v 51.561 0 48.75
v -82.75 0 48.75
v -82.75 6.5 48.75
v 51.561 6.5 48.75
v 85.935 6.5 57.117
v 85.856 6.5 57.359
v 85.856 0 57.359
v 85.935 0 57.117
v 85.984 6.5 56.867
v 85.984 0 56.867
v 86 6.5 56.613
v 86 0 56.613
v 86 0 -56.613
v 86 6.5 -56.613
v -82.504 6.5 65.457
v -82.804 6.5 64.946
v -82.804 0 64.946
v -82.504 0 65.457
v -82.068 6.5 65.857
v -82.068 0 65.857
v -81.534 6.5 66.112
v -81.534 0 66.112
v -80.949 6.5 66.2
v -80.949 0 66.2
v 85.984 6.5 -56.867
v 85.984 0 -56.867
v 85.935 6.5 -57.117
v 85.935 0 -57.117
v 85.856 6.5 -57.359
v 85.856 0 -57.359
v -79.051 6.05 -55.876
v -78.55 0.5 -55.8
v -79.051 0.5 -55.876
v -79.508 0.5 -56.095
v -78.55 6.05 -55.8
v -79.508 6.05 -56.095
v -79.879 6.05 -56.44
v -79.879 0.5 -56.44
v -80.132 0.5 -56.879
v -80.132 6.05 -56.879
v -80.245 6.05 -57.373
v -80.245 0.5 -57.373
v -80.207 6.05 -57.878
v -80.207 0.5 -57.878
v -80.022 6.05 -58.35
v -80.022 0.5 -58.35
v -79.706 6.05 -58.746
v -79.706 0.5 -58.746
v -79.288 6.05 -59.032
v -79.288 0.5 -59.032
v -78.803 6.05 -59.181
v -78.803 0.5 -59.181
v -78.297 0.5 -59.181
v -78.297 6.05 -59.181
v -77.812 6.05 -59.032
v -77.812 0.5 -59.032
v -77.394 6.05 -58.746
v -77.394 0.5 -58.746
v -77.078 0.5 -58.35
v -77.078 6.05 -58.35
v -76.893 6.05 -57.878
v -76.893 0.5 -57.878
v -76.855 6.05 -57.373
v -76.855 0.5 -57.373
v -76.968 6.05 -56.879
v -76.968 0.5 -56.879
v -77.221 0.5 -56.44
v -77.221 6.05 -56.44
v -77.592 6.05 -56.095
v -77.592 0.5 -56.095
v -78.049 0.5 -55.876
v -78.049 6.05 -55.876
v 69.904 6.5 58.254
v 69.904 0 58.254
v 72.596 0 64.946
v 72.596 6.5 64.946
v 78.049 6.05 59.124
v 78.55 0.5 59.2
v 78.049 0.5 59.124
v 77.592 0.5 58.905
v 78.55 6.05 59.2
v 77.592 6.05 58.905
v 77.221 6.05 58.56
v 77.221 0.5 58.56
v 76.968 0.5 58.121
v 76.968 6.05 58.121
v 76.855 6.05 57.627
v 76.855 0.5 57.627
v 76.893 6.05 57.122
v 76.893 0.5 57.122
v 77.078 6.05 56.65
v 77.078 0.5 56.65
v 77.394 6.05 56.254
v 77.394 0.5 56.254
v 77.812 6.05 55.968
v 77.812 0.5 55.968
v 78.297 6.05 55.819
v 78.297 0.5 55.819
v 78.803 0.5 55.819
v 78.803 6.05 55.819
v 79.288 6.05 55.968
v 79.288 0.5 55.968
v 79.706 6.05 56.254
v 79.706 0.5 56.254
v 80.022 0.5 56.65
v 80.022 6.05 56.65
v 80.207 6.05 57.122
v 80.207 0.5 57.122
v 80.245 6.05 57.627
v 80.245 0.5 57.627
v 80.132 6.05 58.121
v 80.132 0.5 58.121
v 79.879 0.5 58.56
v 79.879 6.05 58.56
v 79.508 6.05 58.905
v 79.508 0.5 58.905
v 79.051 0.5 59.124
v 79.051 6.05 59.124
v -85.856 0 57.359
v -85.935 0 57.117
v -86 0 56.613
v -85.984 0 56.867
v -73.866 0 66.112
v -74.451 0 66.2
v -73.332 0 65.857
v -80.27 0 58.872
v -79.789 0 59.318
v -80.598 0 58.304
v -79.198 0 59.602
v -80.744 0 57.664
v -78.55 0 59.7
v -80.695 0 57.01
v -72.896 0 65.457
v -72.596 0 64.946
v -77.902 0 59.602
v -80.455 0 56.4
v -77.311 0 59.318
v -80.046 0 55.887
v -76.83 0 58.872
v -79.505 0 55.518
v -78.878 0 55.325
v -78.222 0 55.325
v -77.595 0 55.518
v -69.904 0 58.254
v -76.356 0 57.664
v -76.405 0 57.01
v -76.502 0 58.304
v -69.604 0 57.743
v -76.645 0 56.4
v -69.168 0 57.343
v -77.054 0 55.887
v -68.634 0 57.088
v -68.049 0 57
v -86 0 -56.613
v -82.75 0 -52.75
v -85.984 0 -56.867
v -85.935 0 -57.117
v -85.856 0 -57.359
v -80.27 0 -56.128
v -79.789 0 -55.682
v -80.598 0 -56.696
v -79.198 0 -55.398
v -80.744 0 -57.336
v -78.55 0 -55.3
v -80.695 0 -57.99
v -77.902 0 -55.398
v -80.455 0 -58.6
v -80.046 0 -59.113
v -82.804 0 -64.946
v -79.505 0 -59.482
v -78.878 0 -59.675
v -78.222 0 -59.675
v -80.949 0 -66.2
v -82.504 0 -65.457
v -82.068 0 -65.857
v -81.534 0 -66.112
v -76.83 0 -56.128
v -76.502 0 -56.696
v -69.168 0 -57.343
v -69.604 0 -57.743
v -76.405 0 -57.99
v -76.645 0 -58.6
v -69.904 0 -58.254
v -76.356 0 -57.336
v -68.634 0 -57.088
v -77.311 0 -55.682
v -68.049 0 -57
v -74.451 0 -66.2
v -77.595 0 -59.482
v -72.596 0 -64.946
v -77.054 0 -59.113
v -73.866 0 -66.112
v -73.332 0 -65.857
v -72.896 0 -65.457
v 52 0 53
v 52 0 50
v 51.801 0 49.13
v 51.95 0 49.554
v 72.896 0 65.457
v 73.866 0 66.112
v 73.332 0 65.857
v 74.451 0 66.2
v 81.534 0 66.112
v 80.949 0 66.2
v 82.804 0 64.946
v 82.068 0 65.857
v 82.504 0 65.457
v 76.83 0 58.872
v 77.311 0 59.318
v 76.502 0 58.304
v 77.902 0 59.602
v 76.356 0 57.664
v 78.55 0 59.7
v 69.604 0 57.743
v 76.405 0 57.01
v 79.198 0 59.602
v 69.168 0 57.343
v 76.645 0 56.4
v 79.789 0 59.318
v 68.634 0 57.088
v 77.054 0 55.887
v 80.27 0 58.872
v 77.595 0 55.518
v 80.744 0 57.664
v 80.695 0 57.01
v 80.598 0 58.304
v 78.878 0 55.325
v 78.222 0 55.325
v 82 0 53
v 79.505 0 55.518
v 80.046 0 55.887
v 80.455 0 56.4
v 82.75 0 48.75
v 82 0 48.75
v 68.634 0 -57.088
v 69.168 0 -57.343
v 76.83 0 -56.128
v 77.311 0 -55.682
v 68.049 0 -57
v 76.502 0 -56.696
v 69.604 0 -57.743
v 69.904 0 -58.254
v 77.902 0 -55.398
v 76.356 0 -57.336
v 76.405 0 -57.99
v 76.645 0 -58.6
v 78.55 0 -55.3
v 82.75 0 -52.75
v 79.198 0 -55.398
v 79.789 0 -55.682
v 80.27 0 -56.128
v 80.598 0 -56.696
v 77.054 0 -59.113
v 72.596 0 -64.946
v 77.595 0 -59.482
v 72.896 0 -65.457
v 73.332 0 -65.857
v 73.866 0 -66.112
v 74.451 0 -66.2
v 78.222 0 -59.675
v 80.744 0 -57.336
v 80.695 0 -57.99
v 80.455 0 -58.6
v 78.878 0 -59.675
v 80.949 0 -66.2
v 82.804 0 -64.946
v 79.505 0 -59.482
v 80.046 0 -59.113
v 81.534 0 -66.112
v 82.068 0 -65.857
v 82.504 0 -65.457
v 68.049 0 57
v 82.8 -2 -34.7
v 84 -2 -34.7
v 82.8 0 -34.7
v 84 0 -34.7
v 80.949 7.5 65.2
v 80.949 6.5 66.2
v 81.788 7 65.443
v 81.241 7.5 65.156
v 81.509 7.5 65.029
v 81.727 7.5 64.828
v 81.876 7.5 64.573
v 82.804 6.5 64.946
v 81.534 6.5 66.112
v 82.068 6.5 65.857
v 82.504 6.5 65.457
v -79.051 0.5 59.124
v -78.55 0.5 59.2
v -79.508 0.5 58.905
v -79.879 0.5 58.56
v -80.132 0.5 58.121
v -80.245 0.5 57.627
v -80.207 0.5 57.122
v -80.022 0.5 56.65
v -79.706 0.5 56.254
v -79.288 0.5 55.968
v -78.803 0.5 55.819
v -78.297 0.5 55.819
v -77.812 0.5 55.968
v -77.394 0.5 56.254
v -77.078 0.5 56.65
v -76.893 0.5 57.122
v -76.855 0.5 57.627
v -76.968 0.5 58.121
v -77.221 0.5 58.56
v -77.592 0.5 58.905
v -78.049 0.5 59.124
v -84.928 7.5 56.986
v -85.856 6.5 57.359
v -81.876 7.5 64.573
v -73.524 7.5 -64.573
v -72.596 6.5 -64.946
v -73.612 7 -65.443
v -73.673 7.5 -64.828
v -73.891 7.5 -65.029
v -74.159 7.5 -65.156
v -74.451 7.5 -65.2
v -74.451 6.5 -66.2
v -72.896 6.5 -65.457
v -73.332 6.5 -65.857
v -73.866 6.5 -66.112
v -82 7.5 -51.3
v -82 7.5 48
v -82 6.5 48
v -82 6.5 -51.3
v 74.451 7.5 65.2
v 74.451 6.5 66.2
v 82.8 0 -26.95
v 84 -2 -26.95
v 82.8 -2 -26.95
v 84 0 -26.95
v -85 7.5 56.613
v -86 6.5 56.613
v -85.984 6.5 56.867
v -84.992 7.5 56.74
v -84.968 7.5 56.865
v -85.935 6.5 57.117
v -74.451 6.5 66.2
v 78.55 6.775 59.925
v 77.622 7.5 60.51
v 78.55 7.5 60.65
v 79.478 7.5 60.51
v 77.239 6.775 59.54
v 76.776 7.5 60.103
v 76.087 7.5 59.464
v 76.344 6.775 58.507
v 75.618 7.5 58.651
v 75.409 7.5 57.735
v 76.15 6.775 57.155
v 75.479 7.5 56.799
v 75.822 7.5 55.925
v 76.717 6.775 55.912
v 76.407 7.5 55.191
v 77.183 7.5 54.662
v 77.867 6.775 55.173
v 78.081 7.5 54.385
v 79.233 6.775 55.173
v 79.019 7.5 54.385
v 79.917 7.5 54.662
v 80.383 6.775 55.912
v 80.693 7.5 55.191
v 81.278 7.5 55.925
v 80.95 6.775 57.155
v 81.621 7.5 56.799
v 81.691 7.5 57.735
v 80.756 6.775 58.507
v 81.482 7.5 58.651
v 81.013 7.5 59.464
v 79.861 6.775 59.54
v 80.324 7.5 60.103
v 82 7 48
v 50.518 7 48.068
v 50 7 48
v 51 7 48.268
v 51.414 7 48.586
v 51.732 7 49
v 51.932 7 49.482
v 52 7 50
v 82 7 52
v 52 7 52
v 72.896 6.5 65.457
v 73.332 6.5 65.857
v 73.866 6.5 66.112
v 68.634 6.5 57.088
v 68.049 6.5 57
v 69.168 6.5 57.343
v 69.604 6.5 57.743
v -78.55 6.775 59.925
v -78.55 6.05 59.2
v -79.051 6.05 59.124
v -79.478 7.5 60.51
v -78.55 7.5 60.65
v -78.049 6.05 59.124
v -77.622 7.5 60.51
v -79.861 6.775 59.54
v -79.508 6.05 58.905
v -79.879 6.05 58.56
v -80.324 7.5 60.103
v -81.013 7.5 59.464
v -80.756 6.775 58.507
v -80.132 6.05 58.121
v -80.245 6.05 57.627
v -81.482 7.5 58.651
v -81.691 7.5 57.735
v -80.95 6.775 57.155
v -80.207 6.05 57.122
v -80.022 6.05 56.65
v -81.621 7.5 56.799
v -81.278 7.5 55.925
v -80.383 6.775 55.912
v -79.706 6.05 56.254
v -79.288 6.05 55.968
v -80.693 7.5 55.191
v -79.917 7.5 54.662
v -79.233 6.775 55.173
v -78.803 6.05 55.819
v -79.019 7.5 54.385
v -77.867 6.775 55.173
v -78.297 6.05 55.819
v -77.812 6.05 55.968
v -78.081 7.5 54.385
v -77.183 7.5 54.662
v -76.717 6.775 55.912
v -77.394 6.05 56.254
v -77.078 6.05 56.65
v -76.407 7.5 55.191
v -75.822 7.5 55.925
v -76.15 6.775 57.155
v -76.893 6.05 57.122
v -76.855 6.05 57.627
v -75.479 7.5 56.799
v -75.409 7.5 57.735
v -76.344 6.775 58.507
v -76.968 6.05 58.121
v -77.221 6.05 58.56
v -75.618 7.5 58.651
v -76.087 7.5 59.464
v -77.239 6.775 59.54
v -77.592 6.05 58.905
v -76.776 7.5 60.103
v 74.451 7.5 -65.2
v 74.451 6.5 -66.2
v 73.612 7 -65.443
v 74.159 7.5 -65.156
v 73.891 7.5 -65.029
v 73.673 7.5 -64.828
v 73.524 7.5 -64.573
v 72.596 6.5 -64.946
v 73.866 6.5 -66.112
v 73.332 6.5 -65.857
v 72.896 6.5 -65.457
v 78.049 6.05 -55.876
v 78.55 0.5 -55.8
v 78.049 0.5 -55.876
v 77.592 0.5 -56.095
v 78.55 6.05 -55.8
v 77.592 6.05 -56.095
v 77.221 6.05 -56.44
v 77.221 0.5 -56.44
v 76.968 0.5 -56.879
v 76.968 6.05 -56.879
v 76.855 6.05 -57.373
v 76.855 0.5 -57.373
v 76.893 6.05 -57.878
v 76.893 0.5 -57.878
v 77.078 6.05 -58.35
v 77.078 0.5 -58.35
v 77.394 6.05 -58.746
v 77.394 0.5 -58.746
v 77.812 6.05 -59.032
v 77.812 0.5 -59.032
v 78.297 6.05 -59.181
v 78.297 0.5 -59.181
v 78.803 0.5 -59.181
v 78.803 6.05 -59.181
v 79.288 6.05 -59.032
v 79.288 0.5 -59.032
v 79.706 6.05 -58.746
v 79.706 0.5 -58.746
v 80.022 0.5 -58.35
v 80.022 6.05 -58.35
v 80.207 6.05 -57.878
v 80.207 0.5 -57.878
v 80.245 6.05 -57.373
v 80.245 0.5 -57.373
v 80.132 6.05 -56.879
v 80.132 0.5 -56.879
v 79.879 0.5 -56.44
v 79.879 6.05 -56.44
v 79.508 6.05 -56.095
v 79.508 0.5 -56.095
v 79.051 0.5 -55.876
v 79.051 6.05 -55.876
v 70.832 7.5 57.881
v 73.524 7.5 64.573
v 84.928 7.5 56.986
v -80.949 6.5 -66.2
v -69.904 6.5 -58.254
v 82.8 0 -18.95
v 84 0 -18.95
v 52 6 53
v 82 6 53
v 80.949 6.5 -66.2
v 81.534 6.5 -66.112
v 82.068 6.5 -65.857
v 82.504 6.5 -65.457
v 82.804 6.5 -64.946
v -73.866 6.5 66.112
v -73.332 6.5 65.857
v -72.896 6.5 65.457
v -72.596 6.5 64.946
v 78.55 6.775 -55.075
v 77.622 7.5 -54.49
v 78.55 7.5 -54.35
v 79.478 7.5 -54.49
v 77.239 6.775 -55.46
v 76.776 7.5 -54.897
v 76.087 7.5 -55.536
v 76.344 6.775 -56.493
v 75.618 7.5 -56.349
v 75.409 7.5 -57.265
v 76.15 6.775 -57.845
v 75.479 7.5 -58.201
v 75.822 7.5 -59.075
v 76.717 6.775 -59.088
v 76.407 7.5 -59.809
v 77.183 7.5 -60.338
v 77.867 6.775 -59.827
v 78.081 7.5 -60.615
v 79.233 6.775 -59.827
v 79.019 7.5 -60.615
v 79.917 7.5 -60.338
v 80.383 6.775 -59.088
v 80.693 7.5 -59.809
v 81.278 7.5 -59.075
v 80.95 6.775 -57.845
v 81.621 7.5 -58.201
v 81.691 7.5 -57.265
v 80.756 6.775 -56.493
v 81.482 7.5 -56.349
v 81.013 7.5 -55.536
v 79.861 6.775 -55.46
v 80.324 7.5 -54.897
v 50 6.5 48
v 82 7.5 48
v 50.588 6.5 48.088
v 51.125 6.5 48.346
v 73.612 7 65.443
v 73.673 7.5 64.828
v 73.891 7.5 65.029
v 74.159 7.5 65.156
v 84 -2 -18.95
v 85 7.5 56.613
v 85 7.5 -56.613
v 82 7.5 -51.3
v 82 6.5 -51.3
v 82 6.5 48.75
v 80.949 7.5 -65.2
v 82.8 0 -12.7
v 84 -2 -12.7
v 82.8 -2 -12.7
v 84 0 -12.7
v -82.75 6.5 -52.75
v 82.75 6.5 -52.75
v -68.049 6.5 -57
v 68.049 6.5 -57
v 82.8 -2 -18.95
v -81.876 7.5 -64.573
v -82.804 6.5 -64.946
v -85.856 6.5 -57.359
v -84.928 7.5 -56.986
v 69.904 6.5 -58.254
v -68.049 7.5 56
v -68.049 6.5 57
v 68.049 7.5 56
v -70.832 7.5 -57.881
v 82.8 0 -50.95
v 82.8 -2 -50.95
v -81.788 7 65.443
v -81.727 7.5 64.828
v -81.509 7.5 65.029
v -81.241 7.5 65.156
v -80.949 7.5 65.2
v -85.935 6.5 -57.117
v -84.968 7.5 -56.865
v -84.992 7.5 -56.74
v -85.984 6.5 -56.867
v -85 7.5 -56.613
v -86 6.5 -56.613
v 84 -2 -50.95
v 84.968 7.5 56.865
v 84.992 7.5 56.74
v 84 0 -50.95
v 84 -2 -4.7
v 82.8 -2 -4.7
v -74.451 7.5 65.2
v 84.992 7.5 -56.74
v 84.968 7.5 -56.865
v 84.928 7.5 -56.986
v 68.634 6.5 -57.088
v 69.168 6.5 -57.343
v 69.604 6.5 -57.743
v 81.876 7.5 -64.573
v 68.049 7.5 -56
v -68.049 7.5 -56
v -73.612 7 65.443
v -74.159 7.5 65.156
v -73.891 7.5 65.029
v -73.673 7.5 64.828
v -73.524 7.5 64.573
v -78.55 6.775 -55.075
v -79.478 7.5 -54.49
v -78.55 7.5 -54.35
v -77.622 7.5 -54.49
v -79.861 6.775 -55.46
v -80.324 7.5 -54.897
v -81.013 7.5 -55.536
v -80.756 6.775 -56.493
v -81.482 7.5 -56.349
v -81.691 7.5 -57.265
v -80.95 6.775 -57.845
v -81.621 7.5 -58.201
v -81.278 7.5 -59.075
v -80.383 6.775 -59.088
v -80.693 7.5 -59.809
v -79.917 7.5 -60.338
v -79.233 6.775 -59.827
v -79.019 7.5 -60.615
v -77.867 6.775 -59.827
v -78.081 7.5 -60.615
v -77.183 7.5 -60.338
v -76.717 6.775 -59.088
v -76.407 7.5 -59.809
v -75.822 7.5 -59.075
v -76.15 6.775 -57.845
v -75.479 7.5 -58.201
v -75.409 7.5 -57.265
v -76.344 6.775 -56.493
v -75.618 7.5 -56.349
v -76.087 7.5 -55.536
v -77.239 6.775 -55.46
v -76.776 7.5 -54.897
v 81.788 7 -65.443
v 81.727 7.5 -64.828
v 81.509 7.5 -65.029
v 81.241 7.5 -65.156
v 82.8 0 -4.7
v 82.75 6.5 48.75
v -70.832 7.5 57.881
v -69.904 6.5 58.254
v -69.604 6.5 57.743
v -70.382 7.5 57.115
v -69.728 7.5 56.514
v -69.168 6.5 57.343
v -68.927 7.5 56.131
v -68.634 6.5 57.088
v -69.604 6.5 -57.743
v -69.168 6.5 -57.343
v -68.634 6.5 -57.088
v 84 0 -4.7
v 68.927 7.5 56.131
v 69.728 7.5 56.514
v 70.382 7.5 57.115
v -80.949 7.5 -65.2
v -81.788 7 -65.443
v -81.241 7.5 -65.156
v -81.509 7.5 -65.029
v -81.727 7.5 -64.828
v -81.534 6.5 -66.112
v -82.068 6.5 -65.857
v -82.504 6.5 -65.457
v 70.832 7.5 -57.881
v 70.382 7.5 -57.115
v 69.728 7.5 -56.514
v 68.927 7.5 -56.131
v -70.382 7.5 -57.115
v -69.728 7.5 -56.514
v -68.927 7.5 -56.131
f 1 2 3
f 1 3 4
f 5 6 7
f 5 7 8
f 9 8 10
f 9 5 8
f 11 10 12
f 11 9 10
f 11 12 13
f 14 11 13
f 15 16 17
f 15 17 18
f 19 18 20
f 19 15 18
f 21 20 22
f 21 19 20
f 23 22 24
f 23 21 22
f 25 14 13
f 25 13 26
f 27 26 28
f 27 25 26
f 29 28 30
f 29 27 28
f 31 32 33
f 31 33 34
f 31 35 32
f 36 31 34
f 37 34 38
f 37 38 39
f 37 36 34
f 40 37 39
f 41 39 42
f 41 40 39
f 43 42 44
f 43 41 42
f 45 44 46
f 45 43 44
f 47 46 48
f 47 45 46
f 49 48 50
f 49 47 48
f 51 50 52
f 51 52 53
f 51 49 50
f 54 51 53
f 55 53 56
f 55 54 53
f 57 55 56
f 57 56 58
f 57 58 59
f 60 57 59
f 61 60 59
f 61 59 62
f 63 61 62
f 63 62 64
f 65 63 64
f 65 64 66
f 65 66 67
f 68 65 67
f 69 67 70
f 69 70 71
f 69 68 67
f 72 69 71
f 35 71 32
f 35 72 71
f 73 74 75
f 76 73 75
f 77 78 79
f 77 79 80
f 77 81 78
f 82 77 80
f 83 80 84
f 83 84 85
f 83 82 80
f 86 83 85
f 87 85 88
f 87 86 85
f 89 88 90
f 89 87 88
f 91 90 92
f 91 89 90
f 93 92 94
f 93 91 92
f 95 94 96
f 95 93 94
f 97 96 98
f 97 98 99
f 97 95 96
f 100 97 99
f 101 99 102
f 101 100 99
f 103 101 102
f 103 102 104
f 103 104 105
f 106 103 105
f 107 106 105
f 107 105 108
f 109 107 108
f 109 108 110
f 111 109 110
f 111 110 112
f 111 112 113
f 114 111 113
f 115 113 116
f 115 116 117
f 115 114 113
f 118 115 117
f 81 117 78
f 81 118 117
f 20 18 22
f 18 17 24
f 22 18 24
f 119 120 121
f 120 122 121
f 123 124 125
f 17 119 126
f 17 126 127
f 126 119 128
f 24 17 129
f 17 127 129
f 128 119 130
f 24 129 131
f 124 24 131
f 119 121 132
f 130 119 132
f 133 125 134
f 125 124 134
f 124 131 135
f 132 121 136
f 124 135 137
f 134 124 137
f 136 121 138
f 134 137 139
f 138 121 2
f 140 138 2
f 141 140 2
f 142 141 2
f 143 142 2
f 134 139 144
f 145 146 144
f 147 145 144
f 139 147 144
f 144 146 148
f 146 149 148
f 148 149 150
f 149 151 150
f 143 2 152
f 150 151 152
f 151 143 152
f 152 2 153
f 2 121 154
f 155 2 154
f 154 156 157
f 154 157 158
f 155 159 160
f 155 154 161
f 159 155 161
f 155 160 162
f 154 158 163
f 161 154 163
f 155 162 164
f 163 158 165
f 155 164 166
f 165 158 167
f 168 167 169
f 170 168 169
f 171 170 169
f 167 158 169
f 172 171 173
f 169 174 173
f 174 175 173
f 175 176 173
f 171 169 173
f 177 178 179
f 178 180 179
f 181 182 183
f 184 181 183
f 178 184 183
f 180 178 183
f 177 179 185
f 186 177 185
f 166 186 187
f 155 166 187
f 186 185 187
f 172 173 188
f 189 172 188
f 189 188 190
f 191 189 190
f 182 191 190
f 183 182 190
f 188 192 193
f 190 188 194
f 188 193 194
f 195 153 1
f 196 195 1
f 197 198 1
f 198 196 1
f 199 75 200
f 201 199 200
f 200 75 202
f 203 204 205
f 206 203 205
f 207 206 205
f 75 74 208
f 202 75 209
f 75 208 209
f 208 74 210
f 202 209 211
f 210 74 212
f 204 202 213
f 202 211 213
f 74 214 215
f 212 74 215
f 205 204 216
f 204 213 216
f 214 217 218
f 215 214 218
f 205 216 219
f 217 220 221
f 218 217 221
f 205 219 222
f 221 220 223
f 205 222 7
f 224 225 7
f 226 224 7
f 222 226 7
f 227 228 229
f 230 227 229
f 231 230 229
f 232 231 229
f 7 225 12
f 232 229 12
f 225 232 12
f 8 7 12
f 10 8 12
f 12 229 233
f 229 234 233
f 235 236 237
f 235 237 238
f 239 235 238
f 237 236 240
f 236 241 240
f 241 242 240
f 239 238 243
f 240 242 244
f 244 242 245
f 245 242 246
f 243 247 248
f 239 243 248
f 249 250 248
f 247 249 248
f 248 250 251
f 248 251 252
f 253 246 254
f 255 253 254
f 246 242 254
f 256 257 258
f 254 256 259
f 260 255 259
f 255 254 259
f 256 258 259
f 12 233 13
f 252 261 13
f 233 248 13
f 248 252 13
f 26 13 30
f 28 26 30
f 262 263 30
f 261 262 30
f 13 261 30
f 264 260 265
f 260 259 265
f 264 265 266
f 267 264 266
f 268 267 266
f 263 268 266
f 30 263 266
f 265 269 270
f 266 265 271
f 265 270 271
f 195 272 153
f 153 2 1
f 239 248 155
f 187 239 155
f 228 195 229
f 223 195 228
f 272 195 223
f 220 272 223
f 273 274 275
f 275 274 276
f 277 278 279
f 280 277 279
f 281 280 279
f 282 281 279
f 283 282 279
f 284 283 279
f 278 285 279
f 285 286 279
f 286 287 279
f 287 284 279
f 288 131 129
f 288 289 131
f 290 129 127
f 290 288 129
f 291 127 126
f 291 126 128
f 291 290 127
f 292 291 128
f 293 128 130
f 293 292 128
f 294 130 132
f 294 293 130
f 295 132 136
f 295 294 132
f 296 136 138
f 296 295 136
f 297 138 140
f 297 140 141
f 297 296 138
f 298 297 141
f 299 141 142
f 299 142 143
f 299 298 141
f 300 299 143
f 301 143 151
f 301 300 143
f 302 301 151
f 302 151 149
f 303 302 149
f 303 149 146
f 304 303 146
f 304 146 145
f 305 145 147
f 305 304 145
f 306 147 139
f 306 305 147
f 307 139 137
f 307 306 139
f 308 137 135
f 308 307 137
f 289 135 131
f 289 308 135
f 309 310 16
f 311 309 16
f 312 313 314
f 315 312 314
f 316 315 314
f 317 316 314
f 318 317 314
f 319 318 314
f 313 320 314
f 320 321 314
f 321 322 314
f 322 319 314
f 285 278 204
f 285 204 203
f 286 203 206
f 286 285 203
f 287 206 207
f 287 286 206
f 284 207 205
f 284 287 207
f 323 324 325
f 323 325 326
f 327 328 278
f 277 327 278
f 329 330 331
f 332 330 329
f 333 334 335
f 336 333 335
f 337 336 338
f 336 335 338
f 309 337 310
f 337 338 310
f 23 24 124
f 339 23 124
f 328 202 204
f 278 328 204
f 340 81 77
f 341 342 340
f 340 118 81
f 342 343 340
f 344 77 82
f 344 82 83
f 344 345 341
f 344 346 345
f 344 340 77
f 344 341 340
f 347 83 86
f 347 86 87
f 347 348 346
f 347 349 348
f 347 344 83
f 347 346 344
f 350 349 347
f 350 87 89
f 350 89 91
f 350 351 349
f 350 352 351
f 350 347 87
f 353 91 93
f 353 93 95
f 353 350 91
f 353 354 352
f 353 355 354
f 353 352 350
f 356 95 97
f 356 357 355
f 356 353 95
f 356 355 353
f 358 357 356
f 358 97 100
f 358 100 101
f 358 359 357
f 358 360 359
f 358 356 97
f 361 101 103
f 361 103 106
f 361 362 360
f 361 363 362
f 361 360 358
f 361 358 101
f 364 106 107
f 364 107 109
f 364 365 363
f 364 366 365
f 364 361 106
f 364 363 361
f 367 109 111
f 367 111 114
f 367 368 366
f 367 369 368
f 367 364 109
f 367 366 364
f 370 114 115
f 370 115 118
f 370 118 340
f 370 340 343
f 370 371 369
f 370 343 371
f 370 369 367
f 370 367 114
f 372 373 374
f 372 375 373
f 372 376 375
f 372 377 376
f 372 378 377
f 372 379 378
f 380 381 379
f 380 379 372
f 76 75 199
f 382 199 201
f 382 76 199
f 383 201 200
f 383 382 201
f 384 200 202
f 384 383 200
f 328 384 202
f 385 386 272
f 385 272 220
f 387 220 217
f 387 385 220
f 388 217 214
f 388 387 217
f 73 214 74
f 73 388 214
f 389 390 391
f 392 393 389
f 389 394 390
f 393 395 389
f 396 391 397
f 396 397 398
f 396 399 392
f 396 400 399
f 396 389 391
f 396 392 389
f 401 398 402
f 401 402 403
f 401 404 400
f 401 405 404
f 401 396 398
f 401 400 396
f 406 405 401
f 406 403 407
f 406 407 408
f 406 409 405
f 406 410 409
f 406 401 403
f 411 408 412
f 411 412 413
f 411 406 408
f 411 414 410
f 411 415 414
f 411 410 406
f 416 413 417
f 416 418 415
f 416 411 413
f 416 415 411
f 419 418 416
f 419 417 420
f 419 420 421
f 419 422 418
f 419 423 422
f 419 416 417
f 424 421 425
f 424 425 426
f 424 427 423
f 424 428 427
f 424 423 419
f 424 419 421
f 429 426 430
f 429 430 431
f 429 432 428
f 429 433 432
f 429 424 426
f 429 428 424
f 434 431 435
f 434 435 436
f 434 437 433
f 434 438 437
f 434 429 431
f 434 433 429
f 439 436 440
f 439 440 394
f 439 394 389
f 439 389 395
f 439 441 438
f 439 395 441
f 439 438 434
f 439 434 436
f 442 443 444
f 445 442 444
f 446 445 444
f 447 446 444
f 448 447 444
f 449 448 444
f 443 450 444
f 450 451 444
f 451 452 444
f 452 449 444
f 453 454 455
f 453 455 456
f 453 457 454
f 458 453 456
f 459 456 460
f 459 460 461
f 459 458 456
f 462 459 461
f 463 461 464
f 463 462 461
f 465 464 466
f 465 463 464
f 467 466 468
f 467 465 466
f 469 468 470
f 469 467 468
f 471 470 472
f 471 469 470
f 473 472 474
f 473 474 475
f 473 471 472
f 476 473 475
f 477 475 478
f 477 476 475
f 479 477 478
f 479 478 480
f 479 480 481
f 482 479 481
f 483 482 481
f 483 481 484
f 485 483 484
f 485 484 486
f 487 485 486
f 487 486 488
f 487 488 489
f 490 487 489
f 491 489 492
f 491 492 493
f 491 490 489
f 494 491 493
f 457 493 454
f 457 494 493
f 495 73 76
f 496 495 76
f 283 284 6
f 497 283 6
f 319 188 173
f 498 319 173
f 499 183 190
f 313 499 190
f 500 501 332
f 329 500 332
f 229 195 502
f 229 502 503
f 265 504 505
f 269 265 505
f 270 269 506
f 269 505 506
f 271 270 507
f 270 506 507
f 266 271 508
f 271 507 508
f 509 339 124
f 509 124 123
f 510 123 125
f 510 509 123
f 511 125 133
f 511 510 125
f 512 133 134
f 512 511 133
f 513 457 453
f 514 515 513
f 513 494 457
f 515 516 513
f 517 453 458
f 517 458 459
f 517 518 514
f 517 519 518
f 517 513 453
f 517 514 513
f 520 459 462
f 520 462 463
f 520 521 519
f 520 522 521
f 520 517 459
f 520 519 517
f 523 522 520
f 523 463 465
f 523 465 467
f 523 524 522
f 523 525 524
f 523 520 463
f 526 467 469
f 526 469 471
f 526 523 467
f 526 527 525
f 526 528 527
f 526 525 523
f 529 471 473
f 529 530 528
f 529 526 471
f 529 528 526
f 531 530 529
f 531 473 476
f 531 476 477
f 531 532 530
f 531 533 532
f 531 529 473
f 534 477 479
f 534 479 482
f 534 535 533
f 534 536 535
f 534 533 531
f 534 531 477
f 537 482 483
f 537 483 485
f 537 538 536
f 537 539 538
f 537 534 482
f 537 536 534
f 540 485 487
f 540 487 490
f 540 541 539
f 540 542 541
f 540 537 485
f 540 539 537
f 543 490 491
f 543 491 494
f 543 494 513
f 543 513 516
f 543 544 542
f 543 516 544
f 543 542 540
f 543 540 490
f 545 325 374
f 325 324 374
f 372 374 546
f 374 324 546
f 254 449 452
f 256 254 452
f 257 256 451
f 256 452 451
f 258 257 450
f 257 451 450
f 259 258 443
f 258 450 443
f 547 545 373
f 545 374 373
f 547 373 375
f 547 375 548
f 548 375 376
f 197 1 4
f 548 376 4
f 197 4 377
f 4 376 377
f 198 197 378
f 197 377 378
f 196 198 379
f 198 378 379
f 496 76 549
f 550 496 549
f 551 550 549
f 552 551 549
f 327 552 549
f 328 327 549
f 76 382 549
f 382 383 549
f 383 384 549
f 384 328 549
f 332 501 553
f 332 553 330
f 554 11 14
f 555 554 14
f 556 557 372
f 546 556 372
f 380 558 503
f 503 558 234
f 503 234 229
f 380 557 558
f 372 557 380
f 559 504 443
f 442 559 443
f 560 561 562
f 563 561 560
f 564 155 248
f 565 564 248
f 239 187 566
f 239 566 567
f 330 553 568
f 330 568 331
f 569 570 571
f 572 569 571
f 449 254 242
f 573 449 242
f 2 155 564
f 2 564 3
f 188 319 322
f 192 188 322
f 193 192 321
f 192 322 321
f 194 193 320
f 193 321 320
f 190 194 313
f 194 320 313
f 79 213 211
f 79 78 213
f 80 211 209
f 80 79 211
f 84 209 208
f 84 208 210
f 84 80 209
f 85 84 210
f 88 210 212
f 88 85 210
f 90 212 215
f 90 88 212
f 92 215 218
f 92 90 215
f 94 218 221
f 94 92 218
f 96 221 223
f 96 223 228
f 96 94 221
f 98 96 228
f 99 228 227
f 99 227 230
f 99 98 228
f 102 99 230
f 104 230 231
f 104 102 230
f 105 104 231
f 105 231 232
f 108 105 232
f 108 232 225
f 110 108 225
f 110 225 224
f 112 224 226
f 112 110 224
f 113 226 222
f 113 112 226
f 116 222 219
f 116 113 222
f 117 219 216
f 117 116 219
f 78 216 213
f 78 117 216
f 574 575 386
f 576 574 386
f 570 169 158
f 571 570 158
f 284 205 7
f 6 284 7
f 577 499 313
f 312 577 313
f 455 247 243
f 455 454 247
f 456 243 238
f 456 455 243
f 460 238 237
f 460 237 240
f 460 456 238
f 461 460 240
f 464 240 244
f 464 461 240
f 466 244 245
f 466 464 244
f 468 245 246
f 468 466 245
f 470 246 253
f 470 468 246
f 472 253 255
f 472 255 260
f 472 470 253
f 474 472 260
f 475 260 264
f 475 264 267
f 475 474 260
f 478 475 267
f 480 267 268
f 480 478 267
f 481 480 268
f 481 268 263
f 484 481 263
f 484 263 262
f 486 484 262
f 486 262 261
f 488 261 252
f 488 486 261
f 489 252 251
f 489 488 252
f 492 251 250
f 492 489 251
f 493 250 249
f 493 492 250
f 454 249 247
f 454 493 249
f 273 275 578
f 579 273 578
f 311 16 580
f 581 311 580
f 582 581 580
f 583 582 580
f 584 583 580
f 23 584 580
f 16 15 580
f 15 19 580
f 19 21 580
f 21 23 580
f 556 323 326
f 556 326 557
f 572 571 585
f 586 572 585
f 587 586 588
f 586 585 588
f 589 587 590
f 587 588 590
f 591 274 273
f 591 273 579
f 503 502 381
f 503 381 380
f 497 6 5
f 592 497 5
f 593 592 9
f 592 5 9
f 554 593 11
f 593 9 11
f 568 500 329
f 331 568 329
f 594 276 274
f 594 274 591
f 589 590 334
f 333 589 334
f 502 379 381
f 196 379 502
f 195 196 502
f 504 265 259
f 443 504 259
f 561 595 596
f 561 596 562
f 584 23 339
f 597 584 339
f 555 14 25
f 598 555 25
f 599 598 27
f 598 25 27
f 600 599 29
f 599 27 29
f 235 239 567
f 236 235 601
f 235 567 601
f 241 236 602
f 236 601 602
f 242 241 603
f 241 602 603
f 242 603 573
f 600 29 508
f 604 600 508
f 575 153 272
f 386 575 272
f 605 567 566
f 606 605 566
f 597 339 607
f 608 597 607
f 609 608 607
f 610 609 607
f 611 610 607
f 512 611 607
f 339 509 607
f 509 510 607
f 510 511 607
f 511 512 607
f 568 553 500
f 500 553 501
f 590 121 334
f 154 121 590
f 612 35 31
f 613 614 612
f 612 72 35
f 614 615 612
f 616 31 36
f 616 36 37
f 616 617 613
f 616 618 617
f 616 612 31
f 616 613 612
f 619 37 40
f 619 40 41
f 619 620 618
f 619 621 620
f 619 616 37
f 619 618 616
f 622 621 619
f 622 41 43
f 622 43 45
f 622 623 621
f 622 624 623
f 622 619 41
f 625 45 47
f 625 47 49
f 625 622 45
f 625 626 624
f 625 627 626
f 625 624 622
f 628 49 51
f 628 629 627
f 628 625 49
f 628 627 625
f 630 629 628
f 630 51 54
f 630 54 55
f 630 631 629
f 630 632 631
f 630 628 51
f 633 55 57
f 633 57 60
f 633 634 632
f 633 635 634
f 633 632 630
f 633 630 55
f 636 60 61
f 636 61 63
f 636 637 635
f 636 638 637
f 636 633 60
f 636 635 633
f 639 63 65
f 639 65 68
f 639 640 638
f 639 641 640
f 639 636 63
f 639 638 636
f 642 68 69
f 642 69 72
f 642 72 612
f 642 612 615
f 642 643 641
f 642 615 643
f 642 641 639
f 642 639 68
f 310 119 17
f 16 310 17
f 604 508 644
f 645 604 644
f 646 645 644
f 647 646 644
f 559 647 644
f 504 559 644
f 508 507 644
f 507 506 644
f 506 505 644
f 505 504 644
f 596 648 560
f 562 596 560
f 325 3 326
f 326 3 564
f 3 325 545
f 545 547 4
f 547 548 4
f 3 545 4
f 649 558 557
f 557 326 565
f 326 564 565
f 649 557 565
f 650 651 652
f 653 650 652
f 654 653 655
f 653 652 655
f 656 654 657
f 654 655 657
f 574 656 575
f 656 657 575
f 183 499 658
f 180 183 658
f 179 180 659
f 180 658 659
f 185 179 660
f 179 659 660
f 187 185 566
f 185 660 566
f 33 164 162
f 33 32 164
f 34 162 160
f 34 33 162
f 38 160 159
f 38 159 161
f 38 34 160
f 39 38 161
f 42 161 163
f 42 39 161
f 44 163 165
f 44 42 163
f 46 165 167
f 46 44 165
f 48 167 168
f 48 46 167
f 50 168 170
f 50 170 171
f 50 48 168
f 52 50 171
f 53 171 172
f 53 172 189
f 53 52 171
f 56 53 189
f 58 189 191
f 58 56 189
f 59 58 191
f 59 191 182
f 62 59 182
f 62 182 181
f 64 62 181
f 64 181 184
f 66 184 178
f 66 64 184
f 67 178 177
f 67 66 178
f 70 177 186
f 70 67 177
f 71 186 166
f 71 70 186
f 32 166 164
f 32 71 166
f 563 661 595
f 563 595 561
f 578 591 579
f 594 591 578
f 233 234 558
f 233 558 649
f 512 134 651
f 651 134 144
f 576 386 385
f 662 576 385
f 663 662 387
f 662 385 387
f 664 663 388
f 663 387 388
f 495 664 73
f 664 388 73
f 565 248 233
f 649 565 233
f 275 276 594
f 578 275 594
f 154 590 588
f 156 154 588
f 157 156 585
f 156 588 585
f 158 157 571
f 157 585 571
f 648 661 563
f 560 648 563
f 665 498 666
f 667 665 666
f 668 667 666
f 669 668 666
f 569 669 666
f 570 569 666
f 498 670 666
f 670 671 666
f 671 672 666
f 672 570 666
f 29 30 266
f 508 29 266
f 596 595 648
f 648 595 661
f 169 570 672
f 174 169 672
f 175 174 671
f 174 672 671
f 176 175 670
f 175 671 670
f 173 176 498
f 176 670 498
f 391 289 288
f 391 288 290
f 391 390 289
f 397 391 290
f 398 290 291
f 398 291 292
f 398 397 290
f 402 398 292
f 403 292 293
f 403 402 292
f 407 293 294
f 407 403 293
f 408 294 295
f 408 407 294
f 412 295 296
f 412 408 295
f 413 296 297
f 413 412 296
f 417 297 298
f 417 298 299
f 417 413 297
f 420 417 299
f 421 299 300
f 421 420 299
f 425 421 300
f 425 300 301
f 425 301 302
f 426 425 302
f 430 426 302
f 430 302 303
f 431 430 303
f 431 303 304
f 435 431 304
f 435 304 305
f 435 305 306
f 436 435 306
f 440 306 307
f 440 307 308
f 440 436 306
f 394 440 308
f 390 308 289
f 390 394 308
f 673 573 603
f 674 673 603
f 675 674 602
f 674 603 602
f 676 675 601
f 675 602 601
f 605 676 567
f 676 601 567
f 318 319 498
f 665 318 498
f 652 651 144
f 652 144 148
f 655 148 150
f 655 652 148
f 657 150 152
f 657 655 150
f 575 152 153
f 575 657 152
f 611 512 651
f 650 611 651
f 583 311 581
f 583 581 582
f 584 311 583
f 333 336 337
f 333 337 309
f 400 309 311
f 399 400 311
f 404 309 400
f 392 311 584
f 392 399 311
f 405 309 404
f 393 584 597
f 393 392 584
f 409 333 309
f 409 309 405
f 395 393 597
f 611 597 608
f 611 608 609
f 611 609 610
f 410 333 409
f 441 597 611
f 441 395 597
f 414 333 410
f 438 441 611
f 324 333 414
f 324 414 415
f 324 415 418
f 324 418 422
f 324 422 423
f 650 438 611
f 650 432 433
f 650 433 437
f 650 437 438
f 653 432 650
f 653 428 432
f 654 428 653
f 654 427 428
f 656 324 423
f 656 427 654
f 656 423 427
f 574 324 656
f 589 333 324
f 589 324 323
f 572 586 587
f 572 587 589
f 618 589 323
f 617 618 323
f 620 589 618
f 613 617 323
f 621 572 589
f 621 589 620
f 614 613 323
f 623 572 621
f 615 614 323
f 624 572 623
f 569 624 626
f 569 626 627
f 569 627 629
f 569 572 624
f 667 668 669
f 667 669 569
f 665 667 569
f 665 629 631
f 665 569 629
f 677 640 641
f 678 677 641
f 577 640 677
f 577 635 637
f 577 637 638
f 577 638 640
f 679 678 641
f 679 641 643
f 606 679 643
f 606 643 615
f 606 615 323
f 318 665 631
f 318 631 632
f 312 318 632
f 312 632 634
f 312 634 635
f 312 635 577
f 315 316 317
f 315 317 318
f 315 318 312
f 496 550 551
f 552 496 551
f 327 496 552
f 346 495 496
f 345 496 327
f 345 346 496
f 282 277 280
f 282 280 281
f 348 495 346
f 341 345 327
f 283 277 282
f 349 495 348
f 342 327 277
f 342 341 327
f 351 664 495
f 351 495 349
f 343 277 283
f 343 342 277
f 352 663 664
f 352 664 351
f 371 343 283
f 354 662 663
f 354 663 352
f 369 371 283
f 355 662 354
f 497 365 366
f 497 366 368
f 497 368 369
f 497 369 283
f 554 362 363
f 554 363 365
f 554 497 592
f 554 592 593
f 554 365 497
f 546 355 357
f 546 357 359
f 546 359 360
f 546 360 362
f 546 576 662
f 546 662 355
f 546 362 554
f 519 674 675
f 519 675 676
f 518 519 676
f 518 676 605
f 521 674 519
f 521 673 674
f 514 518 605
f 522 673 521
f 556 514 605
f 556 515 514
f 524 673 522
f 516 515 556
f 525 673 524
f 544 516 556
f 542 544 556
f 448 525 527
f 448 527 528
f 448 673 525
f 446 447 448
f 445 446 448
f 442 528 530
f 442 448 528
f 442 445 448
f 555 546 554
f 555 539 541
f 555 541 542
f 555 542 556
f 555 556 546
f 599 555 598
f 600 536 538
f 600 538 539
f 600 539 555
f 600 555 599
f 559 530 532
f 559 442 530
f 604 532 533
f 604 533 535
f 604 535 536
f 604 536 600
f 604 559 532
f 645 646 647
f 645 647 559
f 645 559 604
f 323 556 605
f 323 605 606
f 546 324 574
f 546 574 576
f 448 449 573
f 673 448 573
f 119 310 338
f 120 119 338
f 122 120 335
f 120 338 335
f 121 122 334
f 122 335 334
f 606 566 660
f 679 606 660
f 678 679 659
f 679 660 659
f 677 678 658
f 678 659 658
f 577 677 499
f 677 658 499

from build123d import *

# Parameters (mm, degrees)
SKETCH1_W                                      = 172
SKETCH1_H                                      = 114
BOSS_EXTRUDE1_DEPTH                            = 7.5
SKETCH2_W                                      = 164
SKETCH2_H                                      = 100
CUT_EXTRUDE1_DEPTH                             = 109.787361398
SKETCH8_W                                      = 165.5
SKETCH8_H                                      = 101.5
CUT_EXTRUDE3_DEPTH                             = 6.5
CSK_FOR_M3_FLAT_HEAD_MACHINE_SCREW1_AT_2_COUNT = 2
CSK_FOR_M3_FLAT_HEAD_MACHINE_SCREW1_AT_2_PITCH = 157.1
CSK_FOR_M3_FLAT_HEAD_MACHINE_SCREW1_AT_3_COUNT = 2
CSK_FOR_M3_FLAT_HEAD_MACHINE_SCREW1_AT_3_PITCH = 194.693117495
CSK_FOR_M3_FLAT_HEAD_MACHINE_SCREW1_AT_4_COUNT = 2
CSK_FOR_M3_FLAT_HEAD_MACHINE_SCREW1_AT_4_PITCH = 115
CSK_FOR_M3_FLAT_HEAD_MACHINE_SCREW1_AT_5_COUNT = 2
CSK_FOR_M3_FLAT_HEAD_MACHINE_SCREW1_AT_5_PITCH = 97.346558748
BOSS_EXTRUDE2_START                            = -2
SKETCH6_W                                      = 16.25
SKETCH6_H                                      = 2
BOSS_EXTRUDE2_DEPTH                            = 1.2
SKETCH6_W_2                                    = 8
BOSS_EXTRUDE2_2_DEPTH                          = 1.2
BOSS_EXTRUDE2_3_DEPTH                          = 1.2
SKETCH7_W                                      = 30
SKETCH7_H                                      = 5
CUT_EXTRUDE2_DEPTH                             = 7
SKETCH9_W                                      = 164
SKETCH9_H                                      = 1
BOSS_EXTRUDE3_DEPTH                            = 0.7
FILLET1_R                                      = 2
CHAMFER1_SIZE                                  = 1


with BuildPart() as part:
    # Sketch1 → Boss-Extrude1 (new body)
    with BuildSketch(Plane(origin=(0, 0, 0), x_dir=(1, 0, 0), z_dir=(0, 1, 0))):
        Polygon((-69.4, -57), (-86, -57), (-82.3, -66.2), (-73.1, -66.2), align=None)
        Rectangle(SKETCH1_W, SKETCH1_H)
        Polygon((86, -57), (69.4, -57), (73.1, -66.2), (82.3, -66.2), align=None)
        Polygon((73.1, 66.2), (69.4, 57), (86, 57), (82.3, 66.2), align=None)
        Polygon((-82.3, 66.2), (-86, 57), (-69.4, 57), (-73.1, 66.2), align=None)
    extrude(amount=BOSS_EXTRUDE1_DEPTH)

    # Sketch2 → Cut-Extrude1 (cut, through all)
    with BuildSketch(Plane(origin=(0, 7.5, 0), x_dir=(1, 0, 0), z_dir=(0, 1, 0))):
        with Locations((0, 2)):
            Rectangle(SKETCH2_W, SKETCH2_H)
    extrude(amount=-CUT_EXTRUDE1_DEPTH, mode=Mode.SUBTRACT)

    # Sketch8 → Cut-Extrude3 (cut)
    with BuildSketch(Plane.XZ):
        with Locations((0, -2)):
            Rectangle(SKETCH8_W, SKETCH8_H)
    extrude(amount=-CUT_EXTRUDE3_DEPTH, mode=Mode.SUBTRACT)

    # Sketch4 → CSK for M3 Flat Head Machine Screw1 (revolve, cut)
    with BuildSketch(Plane(origin=(-78.55, 7.5, -57.5), x_dir=(0, 0, 1), z_dir=(1, 0, 0))):
        Polygon((0, 0), (0, 7.5), (2.2, 7.5), (1.7, 7), (1.7, 1.45), (3.15, 0), align=None)
    csk_for_m3_flat_head_machine_screw1 = revolve(axis=Axis((-78.55, 13.85, -57.5), (0, -1, 0)), mode=Mode.SUBTRACT)

    # CSK for M3 Flat Head Machine Screw1 at 2: CSK for M3 Flat Head Machine Screw1 ×2
    with Locations(*[(i * CSK_FOR_M3_FLAT_HEAD_MACHINE_SCREW1_AT_2_PITCH, 0, 0) for i in range(1, CSK_FOR_M3_FLAT_HEAD_MACHINE_SCREW1_AT_2_COUNT)]):
        add(csk_for_m3_flat_head_machine_screw1, mode=Mode.SUBTRACT)

    # CSK for M3 Flat Head Machine Screw1 at 3: CSK for M3 Flat Head Machine Screw1 ×2
    with Locations(*[Vector(0.8069109068730828, 0, 0.5906731654386028) * (i * CSK_FOR_M3_FLAT_HEAD_MACHINE_SCREW1_AT_3_PITCH) for i in range(1, CSK_FOR_M3_FLAT_HEAD_MACHINE_SCREW1_AT_3_COUNT)]):
        add(csk_for_m3_flat_head_machine_screw1, mode=Mode.SUBTRACT)

    # CSK for M3 Flat Head Machine Screw1 at 4: CSK for M3 Flat Head Machine Screw1 ×2
    with Locations(*[(0, 0, i * CSK_FOR_M3_FLAT_HEAD_MACHINE_SCREW1_AT_4_PITCH) for i in range(1, CSK_FOR_M3_FLAT_HEAD_MACHINE_SCREW1_AT_4_COUNT)]):
        add(csk_for_m3_flat_head_machine_screw1, mode=Mode.SUBTRACT)

    # CSK for M3 Flat Head Machine Screw1 at 5: CSK for M3 Flat Head Machine Screw1 ×2
    with Locations(*[Vector(0.8069109068730828, 0, 0.5906731654386028) * (i * CSK_FOR_M3_FLAT_HEAD_MACHINE_SCREW1_AT_5_PITCH) for i in range(1, CSK_FOR_M3_FLAT_HEAD_MACHINE_SCREW1_AT_5_COUNT)]):
        add(csk_for_m3_flat_head_machine_screw1, mode=Mode.SUBTRACT)

    # Sketch7 → Cut-Extrude2 (cut)
    with BuildSketch(Plane.XZ):
        with Locations((67, 50.5)):
            Rectangle(SKETCH7_W, SKETCH7_H)
    extrude(amount=-CUT_EXTRUDE2_DEPTH, mode=Mode.SUBTRACT)

    # Sketch9 → Boss-Extrude3 (add)
    with BuildSketch(Plane.XY.offset(-52)):
        with Locations((0, 7)):
            Rectangle(SKETCH9_W, SKETCH9_H)
    extrude(amount=BOSS_EXTRUDE3_DEPTH)

    # Fillet1
    fillet1_edges = [part.edges().sort_by_distance(p)[0] for p in [
        (-86, 3.75, 57),
        (-73.1, 3.75, -66.2),
        (-69.4, 3.75, -57),
        (69.4, 3.75, -57),
        (73.1, 3.75, -66.2),
        (82.3, 3.75, -66.2),
        (86, 3.75, -57),
        (86, 3.75, 57),
        (82.3, 3.75, 66.2),
        (73.1, 3.75, 66.2),
        (69.4, 3.75, 57),
        (-69.4, 3.75, 57),
        (-73.1, 3.75, 66.2),
        (-82.3, 3.75, 66.2),
        (-86, 3.75, -57),
        (-82.3, 3.75, -66.2),
        (52, 6.75, 48),
    ]]
    fillet(fillet1_edges, radius=FILLET1_R)

    # Chamfer1
    chamfer1_edges = [part.edges().sort_by_distance(p)[0] for p in [
        (67, 7, 53),
        (-84.329890843, 7.5, 61.152703851),
        (-86, 7.5, 0),
        (-77.7, 7.5, 66.2),
        (-71.25, 7.5, 61.6),
        (0, 7.5, 57),
        (71.25, 7.5, 61.6),
        (77.7, 7.5, 66.2),
        (84.329890843, 7.5, 61.152703851),
        (86, 7.5, 0),
        (84.329890843, 7.5, -61.152703851),
        (77.7, 7.5, -66.2),
        (71.25, 7.5, -61.6),
        (0, 7.5, -57),
        (-71.25, 7.5, -61.6),
        (-77.7, 7.5, -66.2),
        (-84.329890843, 7.5, -61.152703851),
        (-82.068369823, 7.5, -65.8571836),
        (-85.963557779, 7.5, -56.992946476),
        (-82.068369823, 7.5, 65.8571836),
        (-73.331630177, 7.5, 65.8571836),
        (73.331630177, 7.5, 65.8571836),
        (82.068369823, 7.5, 65.8571836),
        (85.963557779, 7.5, 56.992946476),
        (85.963557779, 7.5, -56.992946476),
        (82.068369823, 7.5, -65.8571836),
        (73.331630177, 7.5, -65.8571836),
        (-73.331630177, 7.5, -65.8571836),
        (-85.963557779, 7.5, 56.992946476),
        (-69.168369823, 7.5, -57.3428164),
        (69.168369823, 7.5, -57.3428164),
        (69.168369823, 7.5, 57.3428164),
        (-69.168369823, 7.5, 57.3428164),
    ]]
    chamfer(chamfer1_edges, length=CHAMFER1_SIZE)


with BuildPart() as body_2:
    # Sketch6 → Boss-Extrude2 (new body)
    with BuildSketch(Plane(origin=(86, 0, 0), x_dir=(0, 0, -1), z_dir=(1, 0, 0)).offset(BOSS_EXTRUDE2_START)):
        with Locations((42.825, -1)):
            Rectangle(SKETCH6_W, SKETCH6_H)
    extrude(amount=-BOSS_EXTRUDE2_DEPTH)


with BuildPart() as body_3:
    # Sketch6 → Boss-Extrude2 2 (new body)
    with BuildSketch(Plane(origin=(86, 0, 0), x_dir=(0, 0, -1), z_dir=(1, 0, 0)).offset(BOSS_EXTRUDE2_START)):
        with Locations((22.95, -1)):
            Rectangle(SKETCH6_W_2, SKETCH6_H)
    extrude(amount=-BOSS_EXTRUDE2_2_DEPTH)


with BuildPart() as body_4:
    # Sketch6 → Boss-Extrude2 3 (new body)
    with BuildSketch(Plane(origin=(86, 0, 0), x_dir=(0, 0, -1), z_dir=(1, 0, 0)).offset(BOSS_EXTRUDE2_START)):
        with Locations((8.7, -1)):
            Rectangle(SKETCH6_W_2, SKETCH6_H)
    extrude(amount=-BOSS_EXTRUDE2_3_DEPTH)


solid = Compound([part.part, body_2.part, body_3.part, body_4.part])
